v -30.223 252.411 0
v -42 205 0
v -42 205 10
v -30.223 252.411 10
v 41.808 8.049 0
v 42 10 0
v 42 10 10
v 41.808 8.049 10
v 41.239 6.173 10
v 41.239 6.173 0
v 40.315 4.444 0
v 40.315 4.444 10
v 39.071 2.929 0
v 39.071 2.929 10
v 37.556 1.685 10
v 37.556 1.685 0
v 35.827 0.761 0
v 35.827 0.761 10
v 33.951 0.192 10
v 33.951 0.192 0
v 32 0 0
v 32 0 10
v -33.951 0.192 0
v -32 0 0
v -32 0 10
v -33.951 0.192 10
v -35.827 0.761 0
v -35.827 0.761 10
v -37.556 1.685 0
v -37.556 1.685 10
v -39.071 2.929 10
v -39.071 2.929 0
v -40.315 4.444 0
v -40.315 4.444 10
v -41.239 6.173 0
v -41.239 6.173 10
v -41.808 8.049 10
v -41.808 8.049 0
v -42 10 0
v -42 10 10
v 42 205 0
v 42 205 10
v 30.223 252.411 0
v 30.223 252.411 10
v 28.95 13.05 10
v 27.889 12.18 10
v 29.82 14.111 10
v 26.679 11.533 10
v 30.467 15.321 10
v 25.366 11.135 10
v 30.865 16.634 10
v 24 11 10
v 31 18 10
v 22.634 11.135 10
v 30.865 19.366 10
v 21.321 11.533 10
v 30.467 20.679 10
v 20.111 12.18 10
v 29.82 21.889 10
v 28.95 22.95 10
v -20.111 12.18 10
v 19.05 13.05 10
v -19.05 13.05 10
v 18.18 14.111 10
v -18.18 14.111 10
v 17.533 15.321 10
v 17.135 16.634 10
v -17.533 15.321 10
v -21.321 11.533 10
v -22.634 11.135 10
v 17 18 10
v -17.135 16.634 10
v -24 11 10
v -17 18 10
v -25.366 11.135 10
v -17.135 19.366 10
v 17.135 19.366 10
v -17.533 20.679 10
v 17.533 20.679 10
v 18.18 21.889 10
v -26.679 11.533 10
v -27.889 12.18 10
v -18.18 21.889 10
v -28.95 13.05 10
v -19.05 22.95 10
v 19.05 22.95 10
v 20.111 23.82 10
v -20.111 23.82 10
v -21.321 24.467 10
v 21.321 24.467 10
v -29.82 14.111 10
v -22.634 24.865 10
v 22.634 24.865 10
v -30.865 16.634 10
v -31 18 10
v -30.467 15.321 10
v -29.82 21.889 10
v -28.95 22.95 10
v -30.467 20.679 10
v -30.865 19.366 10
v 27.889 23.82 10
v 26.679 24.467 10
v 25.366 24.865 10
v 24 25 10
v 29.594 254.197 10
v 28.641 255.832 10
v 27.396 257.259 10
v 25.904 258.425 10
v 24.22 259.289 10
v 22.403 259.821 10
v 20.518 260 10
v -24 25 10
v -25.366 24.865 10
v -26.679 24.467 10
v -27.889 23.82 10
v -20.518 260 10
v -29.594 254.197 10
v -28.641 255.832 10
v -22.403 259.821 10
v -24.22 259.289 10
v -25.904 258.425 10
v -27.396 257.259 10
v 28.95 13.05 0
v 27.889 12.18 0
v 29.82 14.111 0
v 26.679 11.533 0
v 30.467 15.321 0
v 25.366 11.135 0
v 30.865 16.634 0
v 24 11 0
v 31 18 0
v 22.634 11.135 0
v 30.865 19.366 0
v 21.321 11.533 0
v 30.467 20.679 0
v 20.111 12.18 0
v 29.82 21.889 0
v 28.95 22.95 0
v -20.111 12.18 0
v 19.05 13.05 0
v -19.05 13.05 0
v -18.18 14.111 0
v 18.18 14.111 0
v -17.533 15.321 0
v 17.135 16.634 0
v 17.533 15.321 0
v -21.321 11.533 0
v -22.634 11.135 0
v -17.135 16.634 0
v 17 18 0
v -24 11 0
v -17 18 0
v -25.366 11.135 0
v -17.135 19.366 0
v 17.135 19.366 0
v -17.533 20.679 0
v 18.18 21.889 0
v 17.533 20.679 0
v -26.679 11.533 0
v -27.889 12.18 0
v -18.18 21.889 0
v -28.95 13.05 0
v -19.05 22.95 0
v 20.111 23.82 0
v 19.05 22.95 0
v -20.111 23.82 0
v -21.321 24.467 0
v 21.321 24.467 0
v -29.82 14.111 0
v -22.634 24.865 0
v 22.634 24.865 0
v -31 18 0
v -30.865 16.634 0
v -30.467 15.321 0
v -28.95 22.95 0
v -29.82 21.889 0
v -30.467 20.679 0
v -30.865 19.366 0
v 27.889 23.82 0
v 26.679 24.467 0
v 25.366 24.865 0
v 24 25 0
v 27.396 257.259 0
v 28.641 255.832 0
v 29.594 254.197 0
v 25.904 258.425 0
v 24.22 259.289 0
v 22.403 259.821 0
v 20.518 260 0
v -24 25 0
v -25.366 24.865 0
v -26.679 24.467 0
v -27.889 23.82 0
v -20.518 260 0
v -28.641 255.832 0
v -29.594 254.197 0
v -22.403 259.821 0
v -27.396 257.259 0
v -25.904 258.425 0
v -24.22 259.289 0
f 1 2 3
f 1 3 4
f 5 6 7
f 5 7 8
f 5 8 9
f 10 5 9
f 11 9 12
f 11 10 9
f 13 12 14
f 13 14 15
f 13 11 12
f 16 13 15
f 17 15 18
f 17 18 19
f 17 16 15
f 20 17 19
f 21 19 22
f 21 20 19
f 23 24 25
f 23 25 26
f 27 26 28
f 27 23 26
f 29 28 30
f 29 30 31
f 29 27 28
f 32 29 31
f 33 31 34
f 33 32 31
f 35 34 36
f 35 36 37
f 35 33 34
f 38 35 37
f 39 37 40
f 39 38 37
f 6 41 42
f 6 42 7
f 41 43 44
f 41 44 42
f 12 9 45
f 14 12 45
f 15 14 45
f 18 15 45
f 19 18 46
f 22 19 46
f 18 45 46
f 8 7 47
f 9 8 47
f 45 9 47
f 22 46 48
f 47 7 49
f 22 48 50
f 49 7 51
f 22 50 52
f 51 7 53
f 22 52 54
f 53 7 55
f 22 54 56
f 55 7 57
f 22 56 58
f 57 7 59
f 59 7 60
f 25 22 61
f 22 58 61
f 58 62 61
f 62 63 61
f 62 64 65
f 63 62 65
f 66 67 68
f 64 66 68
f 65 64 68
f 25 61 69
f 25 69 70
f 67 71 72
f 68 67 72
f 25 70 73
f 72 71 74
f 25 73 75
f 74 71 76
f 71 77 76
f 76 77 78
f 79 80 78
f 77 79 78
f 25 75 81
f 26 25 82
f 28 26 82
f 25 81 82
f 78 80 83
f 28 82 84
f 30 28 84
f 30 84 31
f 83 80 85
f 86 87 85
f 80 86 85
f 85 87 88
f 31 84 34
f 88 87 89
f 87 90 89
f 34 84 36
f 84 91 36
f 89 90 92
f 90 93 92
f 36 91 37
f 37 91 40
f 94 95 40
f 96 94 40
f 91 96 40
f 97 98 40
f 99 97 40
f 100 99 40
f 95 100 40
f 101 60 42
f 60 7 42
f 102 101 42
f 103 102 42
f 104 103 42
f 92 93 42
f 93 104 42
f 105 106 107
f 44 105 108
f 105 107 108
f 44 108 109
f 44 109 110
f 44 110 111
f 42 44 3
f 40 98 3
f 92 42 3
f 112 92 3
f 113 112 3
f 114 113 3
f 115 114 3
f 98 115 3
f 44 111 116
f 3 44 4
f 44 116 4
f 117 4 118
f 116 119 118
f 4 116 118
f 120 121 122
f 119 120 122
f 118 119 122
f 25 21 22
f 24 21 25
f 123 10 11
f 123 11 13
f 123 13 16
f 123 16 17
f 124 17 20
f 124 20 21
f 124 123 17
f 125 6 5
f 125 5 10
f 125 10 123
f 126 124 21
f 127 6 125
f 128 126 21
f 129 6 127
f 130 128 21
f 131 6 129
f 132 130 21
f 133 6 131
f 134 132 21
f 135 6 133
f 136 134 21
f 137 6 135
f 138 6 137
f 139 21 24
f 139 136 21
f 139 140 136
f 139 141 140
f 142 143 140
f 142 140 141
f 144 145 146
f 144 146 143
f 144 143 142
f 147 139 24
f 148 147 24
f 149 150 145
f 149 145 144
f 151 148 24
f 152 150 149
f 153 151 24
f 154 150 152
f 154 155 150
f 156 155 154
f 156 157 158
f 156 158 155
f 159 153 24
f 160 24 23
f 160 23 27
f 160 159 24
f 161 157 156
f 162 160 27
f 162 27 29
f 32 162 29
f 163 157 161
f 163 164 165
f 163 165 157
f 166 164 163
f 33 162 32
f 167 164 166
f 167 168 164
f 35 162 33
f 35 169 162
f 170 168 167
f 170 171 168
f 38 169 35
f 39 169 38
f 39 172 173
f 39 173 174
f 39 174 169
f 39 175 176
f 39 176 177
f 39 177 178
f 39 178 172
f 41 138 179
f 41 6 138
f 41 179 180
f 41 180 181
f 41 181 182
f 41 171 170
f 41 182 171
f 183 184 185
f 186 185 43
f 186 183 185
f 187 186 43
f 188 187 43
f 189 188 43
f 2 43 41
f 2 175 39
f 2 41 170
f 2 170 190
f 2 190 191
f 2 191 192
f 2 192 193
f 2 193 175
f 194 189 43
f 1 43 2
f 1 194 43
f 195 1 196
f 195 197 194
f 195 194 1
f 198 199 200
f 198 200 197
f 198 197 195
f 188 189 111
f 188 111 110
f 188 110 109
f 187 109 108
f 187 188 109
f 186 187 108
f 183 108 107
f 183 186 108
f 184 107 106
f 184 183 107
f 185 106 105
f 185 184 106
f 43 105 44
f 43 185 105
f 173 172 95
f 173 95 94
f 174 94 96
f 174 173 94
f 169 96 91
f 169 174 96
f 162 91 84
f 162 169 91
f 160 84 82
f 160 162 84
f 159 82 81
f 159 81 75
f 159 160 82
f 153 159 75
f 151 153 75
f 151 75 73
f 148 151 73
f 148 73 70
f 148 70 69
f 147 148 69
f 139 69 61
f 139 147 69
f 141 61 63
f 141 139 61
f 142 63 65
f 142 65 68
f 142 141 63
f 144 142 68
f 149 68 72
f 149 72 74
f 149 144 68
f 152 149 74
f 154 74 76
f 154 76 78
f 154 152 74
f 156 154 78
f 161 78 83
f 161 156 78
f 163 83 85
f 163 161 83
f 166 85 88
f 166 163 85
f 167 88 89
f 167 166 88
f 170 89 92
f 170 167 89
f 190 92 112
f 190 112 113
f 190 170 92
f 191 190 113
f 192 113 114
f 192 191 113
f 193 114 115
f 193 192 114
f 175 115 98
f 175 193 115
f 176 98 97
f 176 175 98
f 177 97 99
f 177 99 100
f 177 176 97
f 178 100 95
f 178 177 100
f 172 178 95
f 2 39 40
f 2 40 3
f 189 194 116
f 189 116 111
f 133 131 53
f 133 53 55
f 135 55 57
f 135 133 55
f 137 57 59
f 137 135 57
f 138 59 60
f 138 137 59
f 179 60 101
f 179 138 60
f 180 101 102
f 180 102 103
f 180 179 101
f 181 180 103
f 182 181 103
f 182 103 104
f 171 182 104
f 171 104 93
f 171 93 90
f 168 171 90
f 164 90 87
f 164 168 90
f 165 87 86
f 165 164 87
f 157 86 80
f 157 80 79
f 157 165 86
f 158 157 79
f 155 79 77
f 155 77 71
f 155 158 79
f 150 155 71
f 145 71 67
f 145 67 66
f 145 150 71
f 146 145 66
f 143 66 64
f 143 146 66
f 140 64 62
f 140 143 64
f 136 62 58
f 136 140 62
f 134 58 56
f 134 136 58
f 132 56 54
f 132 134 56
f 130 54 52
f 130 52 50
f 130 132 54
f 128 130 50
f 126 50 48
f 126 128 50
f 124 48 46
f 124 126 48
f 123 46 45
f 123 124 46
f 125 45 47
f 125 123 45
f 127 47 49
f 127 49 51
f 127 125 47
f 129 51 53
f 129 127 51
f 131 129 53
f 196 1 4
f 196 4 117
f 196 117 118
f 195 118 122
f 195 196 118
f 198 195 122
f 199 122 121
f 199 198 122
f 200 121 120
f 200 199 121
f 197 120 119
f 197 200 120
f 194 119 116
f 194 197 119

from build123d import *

# Parameters (mm, degrees)
SKETCH1_R           = 7
BOSS_EXTRUDE1_DEPTH = 10


with BuildPart() as part:
    # Sketch1 → Boss-Extrude1 (new body)
    with BuildSketch(Plane.XY):
        with BuildLine():
            Line((-20.517714388, 260), (20.517714388, 260))
            ThreePointArc((20.517714388, 260), (26.67774114, 257.877440601), (30.222763355, 252.410814084))
            Line((30.222763355, 252.410814084), (42, 205))
            Line((42, 205), (42, 10))
            ThreePointArc((42, 10), (39.071067812, 2.928932188), (32, 0))
            Line((32, 0), (-32, 0))
            ThreePointArc((-32, 0), (-39.071067812, 2.928932188), (-42, 10))
            Line((-42, 10), (-42, 205))
            Line((-42, 205), (-30.222763355, 252.410814084))
            ThreePointArc((-30.222763355, 252.410814084), (-26.67774114, 257.877440601), (-20.517714388, 260))
        make_face()
        with Locations((24, 18)):
            Circle(SKETCH1_R, mode=Mode.SUBTRACT)
        with Locations(Location((-24, 18, 0), (0, 0, 180))):
            Circle(SKETCH1_R, mode=Mode.SUBTRACT)
    extrude(amount=BOSS_EXTRUDE1_DEPTH)


solid = part.part
